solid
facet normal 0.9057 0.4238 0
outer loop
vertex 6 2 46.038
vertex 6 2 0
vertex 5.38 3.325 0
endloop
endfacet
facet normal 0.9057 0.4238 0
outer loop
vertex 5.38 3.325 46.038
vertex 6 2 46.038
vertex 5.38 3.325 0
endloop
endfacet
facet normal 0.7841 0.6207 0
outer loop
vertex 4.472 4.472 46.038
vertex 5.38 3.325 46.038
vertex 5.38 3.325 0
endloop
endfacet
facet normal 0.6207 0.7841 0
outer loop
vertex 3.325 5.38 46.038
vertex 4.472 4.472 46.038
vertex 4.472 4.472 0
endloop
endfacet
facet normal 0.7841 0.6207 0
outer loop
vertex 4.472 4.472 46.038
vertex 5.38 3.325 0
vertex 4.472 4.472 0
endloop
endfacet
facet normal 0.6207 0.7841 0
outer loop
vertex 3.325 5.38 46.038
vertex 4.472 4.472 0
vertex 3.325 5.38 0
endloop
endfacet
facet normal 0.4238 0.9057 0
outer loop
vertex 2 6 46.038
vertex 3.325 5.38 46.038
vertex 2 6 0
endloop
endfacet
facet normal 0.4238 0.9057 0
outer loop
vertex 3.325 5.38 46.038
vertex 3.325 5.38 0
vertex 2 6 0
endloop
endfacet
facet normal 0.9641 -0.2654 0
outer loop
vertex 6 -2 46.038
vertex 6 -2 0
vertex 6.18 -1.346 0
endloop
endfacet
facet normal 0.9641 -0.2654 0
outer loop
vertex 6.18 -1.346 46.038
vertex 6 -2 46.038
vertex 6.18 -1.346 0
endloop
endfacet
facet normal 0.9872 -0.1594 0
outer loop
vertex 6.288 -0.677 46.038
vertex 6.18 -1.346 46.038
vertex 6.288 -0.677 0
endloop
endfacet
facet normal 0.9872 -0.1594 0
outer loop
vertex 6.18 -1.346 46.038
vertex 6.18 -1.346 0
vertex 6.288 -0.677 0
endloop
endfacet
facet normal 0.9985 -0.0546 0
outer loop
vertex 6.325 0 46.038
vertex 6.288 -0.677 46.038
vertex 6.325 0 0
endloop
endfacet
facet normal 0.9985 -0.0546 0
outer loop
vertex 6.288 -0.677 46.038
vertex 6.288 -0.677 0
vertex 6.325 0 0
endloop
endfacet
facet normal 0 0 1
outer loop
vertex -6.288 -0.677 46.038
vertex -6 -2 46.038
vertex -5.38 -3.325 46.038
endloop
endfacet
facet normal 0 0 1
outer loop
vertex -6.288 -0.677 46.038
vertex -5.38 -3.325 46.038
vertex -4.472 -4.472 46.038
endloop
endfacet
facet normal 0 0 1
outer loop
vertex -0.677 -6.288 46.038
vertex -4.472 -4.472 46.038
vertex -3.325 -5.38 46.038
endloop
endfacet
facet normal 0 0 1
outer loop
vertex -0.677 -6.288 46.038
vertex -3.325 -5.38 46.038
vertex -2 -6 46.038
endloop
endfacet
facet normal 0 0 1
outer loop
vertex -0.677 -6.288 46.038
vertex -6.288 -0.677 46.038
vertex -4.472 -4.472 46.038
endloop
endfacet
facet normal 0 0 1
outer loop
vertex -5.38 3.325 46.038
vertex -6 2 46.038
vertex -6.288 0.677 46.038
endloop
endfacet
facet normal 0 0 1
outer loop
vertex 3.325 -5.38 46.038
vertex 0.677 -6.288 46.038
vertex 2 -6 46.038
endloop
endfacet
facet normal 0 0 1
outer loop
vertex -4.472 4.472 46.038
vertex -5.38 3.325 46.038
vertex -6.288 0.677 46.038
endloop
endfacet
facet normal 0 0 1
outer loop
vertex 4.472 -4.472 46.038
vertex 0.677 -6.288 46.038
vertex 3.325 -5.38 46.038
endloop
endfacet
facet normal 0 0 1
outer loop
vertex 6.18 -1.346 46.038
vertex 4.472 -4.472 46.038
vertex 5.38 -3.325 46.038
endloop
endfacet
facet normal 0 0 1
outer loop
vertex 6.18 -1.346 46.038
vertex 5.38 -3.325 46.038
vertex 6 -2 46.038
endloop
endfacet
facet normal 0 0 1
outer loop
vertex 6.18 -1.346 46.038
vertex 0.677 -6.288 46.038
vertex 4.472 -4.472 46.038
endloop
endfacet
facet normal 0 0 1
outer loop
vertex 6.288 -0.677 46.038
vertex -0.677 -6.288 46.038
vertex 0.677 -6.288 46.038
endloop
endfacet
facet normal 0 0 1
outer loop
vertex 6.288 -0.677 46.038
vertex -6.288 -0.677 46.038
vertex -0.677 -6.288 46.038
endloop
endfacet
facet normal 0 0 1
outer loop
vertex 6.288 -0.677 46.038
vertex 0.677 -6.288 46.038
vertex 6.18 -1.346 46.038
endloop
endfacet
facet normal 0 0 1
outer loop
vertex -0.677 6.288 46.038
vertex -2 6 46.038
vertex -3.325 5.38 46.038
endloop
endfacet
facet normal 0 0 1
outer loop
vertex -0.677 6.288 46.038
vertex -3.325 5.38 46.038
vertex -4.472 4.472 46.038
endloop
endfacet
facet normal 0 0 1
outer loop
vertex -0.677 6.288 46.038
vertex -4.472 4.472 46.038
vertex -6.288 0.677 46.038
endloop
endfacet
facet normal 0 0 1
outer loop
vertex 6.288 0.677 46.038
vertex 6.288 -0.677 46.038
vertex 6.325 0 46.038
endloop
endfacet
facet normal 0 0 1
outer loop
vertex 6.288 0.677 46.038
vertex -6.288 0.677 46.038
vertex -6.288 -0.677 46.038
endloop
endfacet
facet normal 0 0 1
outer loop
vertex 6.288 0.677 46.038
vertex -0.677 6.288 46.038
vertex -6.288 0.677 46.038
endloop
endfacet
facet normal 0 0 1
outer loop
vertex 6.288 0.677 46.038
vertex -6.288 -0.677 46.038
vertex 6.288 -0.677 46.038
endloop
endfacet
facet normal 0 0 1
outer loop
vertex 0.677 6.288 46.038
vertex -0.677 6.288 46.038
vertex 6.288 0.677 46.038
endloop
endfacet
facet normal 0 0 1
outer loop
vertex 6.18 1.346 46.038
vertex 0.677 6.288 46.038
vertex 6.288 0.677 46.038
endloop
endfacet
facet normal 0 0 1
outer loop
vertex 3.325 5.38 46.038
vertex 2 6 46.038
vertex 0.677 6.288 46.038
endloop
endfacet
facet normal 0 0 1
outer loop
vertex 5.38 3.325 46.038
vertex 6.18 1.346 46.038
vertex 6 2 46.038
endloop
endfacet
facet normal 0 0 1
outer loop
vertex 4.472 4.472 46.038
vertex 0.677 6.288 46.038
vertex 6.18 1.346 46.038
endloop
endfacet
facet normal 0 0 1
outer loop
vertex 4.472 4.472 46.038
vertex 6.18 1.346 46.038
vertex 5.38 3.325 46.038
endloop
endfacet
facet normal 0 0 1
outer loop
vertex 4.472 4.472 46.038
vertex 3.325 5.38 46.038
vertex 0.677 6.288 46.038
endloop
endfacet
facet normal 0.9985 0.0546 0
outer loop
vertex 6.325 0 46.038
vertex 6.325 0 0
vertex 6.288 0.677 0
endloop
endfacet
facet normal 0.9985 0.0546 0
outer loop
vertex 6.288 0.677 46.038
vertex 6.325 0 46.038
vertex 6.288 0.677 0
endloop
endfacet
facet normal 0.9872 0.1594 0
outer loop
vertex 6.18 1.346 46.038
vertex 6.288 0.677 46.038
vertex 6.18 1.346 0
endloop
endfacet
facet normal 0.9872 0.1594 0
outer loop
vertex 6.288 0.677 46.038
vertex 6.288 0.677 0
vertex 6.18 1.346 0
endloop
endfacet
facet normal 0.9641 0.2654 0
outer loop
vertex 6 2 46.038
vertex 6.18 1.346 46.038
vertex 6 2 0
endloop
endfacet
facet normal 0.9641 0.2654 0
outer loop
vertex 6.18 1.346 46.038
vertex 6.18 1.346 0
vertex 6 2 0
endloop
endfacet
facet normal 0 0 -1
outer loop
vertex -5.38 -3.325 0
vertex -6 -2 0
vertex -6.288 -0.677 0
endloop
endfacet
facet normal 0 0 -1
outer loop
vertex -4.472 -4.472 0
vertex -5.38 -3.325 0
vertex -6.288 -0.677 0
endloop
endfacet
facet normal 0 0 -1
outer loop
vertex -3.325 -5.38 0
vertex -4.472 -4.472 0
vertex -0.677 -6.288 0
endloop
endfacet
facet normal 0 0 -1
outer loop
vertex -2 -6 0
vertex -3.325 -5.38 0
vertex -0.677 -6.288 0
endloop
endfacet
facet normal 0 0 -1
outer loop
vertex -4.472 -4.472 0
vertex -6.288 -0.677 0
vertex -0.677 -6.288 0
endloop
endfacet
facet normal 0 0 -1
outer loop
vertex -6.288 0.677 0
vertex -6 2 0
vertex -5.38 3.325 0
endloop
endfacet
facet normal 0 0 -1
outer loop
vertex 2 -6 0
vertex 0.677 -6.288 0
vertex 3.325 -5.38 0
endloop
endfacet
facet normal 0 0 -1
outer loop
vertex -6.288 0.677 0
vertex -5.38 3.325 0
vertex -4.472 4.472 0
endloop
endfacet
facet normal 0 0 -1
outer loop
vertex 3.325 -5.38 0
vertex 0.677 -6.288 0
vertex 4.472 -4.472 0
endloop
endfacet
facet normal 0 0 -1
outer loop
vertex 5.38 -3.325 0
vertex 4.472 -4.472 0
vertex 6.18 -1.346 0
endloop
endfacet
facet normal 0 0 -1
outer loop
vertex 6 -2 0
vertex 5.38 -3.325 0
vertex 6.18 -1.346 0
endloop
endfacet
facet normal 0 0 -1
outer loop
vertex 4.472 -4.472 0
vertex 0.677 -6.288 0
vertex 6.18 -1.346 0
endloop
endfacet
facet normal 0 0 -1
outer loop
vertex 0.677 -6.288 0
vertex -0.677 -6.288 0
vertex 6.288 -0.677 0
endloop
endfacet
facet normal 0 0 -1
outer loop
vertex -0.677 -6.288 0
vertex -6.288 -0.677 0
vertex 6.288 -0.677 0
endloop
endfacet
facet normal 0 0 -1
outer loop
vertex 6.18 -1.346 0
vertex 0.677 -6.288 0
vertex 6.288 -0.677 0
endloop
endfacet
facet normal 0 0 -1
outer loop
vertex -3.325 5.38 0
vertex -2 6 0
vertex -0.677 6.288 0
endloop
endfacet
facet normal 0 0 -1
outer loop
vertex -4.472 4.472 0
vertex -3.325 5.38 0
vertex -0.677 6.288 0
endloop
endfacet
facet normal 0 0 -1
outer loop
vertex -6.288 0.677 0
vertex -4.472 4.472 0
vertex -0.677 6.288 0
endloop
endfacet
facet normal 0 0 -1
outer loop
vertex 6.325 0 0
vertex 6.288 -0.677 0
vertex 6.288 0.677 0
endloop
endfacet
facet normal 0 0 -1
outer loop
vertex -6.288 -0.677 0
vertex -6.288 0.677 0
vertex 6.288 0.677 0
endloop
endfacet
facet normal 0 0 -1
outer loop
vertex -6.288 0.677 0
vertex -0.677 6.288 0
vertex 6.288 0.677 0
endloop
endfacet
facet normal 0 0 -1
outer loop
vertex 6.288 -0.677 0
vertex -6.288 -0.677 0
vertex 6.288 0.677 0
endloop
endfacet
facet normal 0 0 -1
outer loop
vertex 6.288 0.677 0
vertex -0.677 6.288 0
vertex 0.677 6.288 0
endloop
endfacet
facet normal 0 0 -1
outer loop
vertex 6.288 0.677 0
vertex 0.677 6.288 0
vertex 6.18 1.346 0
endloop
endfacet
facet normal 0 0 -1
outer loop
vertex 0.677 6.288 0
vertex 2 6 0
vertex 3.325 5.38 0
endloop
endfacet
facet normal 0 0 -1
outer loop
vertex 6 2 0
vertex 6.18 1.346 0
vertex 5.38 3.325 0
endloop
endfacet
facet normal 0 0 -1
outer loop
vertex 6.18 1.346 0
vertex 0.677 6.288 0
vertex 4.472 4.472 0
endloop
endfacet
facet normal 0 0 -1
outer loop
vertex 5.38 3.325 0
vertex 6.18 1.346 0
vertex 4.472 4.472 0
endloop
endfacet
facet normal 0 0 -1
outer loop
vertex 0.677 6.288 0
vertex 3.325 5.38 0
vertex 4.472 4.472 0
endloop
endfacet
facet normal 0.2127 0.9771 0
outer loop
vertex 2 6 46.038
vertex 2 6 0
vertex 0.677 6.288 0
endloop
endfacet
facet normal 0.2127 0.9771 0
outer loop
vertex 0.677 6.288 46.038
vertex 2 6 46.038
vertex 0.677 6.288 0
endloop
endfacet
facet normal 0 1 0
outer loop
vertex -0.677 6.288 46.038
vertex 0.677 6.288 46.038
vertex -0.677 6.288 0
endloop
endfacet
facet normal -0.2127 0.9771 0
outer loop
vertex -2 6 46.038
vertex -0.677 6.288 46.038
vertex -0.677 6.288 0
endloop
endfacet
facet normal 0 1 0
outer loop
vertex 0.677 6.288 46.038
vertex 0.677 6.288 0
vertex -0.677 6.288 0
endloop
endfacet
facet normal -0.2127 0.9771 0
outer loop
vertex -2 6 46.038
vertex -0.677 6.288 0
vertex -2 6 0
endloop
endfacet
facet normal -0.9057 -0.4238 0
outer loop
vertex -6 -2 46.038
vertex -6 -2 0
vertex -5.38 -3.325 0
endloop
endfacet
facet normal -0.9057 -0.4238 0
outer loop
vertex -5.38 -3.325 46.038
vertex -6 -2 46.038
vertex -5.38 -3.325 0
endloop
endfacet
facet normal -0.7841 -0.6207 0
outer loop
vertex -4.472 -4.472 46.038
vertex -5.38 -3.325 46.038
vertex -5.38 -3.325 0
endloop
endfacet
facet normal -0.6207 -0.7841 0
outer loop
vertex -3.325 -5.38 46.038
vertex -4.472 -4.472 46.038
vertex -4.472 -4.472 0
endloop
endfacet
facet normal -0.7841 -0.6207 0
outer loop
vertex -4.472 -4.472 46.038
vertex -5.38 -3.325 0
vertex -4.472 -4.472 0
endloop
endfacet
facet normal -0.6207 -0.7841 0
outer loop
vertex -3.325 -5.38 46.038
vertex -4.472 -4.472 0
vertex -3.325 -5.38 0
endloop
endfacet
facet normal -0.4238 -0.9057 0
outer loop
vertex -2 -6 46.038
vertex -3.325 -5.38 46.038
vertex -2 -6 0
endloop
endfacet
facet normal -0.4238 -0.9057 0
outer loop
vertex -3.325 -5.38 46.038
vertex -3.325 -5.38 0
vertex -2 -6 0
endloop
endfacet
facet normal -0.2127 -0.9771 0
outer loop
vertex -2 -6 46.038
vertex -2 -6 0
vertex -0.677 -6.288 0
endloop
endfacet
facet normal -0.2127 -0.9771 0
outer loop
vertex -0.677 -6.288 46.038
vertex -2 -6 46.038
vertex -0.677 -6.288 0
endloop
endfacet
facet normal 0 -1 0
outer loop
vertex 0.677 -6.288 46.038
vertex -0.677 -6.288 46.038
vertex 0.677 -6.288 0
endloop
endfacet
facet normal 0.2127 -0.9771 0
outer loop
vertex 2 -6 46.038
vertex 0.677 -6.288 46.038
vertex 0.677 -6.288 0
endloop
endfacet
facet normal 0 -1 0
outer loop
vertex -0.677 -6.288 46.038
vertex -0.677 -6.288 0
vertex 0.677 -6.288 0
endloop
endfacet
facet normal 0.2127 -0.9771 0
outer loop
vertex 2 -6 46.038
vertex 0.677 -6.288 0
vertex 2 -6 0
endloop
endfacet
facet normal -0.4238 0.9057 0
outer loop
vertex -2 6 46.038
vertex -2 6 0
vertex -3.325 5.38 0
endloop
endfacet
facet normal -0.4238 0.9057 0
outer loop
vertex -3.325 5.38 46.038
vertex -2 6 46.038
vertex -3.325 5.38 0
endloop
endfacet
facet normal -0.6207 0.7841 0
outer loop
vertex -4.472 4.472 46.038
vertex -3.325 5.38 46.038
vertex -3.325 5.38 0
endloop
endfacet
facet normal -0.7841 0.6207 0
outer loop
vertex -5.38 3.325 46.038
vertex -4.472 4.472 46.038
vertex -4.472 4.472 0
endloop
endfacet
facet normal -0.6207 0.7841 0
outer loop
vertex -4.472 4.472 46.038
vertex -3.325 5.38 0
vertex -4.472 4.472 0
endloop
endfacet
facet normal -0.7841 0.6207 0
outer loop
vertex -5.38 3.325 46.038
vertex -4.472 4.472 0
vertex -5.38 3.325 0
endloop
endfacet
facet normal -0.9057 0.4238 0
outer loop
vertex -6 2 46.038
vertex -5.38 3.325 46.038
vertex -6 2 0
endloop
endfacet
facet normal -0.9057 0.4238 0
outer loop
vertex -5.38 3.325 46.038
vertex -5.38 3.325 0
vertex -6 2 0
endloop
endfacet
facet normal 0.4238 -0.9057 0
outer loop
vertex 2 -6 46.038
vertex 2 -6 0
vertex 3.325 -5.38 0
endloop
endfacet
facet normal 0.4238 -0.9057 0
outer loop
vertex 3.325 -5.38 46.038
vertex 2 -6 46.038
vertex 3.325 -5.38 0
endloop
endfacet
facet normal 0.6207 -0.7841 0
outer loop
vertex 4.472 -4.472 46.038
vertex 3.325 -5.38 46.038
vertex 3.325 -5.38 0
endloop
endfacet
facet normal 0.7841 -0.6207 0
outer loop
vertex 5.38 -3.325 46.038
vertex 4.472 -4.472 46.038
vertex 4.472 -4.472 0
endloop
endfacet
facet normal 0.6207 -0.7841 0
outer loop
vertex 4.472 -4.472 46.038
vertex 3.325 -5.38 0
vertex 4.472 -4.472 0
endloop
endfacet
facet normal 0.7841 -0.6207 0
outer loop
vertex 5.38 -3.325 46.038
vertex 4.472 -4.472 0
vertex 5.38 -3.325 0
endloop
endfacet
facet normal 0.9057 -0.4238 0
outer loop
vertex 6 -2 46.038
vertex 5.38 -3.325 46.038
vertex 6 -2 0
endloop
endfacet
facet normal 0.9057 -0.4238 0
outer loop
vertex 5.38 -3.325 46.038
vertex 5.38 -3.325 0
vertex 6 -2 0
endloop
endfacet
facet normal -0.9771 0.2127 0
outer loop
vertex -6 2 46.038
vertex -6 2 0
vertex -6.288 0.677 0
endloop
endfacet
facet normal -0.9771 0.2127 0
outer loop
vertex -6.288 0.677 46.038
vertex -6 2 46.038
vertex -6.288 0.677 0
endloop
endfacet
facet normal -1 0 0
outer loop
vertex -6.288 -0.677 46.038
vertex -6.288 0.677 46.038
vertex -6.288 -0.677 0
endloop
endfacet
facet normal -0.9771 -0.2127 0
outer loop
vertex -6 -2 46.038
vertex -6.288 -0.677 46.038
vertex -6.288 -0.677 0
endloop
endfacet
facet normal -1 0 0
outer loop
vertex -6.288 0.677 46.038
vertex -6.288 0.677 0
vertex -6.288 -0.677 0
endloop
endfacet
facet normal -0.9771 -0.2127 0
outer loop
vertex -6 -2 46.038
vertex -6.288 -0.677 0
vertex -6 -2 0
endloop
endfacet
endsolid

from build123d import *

# Parameters (mm, degrees)
F1_DEPTH = 46.0375


with BuildPart() as f1:
    # F0 (on Top) → F1 (new body)
    with BuildSketch(Plane.XY):
        with BuildLine():
            ThreePointArc((6, -2), (6.2428892318, -1.0130814572), (6.3245553203, 0))
            ThreePointArc((6.3245553203, 0), (6.2428892318, 1.0130814572), (6, 2))
            Line((6, 2), (6, -2))
        make_face()
        with BuildLine():
            Line((2, 2), (6, 2))
            ThreePointArc((6, 2), (4.472135955, 4.472135955), (2, 6))
            Line((2, 6), (2, 2))
        make_face()
        Polygon((6, -2), (6, 2), (2, 2), (2, 6), (-2, 6), (-2, 2), (-6, 2), (-6, -2), (-2, -2), (-2, -6), (2, -6), (2, -2), align=None)
        with BuildLine():
            ThreePointArc((2, -6), (4.472135955, -4.472135955), (6, -2))
            Line((6, -2), (2, -2))
            Line((2, -2), (2, -6))
        make_face()
        with BuildLine():
            Line((-2, 6), (2, 6))
            ThreePointArc((2, 6), (0, 6.3245553203), (-2, 6))
        make_face()
        with BuildLine():
            ThreePointArc((-2, -6), (0, -6.3245553203), (2, -6))
            Line((2, -6), (-2, -6))
        make_face()
        with BuildLine():
            Line((-2, 2), (-2, 6))
            ThreePointArc((-2, 6), (-4.472135955, 4.472135955), (-6, 2))
            Line((-6, 2), (-2, 2))
        make_face()
        with BuildLine():
            ThreePointArc((-6, -2), (-4.472135955, -4.472135955), (-2, -6))
            Line((-2, -6), (-2, -2))
            Line((-2, -2), (-6, -2))
        make_face()
        with BuildLine():
            Line((-6, -2), (-6, 2))
            ThreePointArc((-6, 2), (-6.3245553203, 0), (-6, -2))
        make_face()
    extrude(amount=F1_DEPTH)


solid = f1.part
